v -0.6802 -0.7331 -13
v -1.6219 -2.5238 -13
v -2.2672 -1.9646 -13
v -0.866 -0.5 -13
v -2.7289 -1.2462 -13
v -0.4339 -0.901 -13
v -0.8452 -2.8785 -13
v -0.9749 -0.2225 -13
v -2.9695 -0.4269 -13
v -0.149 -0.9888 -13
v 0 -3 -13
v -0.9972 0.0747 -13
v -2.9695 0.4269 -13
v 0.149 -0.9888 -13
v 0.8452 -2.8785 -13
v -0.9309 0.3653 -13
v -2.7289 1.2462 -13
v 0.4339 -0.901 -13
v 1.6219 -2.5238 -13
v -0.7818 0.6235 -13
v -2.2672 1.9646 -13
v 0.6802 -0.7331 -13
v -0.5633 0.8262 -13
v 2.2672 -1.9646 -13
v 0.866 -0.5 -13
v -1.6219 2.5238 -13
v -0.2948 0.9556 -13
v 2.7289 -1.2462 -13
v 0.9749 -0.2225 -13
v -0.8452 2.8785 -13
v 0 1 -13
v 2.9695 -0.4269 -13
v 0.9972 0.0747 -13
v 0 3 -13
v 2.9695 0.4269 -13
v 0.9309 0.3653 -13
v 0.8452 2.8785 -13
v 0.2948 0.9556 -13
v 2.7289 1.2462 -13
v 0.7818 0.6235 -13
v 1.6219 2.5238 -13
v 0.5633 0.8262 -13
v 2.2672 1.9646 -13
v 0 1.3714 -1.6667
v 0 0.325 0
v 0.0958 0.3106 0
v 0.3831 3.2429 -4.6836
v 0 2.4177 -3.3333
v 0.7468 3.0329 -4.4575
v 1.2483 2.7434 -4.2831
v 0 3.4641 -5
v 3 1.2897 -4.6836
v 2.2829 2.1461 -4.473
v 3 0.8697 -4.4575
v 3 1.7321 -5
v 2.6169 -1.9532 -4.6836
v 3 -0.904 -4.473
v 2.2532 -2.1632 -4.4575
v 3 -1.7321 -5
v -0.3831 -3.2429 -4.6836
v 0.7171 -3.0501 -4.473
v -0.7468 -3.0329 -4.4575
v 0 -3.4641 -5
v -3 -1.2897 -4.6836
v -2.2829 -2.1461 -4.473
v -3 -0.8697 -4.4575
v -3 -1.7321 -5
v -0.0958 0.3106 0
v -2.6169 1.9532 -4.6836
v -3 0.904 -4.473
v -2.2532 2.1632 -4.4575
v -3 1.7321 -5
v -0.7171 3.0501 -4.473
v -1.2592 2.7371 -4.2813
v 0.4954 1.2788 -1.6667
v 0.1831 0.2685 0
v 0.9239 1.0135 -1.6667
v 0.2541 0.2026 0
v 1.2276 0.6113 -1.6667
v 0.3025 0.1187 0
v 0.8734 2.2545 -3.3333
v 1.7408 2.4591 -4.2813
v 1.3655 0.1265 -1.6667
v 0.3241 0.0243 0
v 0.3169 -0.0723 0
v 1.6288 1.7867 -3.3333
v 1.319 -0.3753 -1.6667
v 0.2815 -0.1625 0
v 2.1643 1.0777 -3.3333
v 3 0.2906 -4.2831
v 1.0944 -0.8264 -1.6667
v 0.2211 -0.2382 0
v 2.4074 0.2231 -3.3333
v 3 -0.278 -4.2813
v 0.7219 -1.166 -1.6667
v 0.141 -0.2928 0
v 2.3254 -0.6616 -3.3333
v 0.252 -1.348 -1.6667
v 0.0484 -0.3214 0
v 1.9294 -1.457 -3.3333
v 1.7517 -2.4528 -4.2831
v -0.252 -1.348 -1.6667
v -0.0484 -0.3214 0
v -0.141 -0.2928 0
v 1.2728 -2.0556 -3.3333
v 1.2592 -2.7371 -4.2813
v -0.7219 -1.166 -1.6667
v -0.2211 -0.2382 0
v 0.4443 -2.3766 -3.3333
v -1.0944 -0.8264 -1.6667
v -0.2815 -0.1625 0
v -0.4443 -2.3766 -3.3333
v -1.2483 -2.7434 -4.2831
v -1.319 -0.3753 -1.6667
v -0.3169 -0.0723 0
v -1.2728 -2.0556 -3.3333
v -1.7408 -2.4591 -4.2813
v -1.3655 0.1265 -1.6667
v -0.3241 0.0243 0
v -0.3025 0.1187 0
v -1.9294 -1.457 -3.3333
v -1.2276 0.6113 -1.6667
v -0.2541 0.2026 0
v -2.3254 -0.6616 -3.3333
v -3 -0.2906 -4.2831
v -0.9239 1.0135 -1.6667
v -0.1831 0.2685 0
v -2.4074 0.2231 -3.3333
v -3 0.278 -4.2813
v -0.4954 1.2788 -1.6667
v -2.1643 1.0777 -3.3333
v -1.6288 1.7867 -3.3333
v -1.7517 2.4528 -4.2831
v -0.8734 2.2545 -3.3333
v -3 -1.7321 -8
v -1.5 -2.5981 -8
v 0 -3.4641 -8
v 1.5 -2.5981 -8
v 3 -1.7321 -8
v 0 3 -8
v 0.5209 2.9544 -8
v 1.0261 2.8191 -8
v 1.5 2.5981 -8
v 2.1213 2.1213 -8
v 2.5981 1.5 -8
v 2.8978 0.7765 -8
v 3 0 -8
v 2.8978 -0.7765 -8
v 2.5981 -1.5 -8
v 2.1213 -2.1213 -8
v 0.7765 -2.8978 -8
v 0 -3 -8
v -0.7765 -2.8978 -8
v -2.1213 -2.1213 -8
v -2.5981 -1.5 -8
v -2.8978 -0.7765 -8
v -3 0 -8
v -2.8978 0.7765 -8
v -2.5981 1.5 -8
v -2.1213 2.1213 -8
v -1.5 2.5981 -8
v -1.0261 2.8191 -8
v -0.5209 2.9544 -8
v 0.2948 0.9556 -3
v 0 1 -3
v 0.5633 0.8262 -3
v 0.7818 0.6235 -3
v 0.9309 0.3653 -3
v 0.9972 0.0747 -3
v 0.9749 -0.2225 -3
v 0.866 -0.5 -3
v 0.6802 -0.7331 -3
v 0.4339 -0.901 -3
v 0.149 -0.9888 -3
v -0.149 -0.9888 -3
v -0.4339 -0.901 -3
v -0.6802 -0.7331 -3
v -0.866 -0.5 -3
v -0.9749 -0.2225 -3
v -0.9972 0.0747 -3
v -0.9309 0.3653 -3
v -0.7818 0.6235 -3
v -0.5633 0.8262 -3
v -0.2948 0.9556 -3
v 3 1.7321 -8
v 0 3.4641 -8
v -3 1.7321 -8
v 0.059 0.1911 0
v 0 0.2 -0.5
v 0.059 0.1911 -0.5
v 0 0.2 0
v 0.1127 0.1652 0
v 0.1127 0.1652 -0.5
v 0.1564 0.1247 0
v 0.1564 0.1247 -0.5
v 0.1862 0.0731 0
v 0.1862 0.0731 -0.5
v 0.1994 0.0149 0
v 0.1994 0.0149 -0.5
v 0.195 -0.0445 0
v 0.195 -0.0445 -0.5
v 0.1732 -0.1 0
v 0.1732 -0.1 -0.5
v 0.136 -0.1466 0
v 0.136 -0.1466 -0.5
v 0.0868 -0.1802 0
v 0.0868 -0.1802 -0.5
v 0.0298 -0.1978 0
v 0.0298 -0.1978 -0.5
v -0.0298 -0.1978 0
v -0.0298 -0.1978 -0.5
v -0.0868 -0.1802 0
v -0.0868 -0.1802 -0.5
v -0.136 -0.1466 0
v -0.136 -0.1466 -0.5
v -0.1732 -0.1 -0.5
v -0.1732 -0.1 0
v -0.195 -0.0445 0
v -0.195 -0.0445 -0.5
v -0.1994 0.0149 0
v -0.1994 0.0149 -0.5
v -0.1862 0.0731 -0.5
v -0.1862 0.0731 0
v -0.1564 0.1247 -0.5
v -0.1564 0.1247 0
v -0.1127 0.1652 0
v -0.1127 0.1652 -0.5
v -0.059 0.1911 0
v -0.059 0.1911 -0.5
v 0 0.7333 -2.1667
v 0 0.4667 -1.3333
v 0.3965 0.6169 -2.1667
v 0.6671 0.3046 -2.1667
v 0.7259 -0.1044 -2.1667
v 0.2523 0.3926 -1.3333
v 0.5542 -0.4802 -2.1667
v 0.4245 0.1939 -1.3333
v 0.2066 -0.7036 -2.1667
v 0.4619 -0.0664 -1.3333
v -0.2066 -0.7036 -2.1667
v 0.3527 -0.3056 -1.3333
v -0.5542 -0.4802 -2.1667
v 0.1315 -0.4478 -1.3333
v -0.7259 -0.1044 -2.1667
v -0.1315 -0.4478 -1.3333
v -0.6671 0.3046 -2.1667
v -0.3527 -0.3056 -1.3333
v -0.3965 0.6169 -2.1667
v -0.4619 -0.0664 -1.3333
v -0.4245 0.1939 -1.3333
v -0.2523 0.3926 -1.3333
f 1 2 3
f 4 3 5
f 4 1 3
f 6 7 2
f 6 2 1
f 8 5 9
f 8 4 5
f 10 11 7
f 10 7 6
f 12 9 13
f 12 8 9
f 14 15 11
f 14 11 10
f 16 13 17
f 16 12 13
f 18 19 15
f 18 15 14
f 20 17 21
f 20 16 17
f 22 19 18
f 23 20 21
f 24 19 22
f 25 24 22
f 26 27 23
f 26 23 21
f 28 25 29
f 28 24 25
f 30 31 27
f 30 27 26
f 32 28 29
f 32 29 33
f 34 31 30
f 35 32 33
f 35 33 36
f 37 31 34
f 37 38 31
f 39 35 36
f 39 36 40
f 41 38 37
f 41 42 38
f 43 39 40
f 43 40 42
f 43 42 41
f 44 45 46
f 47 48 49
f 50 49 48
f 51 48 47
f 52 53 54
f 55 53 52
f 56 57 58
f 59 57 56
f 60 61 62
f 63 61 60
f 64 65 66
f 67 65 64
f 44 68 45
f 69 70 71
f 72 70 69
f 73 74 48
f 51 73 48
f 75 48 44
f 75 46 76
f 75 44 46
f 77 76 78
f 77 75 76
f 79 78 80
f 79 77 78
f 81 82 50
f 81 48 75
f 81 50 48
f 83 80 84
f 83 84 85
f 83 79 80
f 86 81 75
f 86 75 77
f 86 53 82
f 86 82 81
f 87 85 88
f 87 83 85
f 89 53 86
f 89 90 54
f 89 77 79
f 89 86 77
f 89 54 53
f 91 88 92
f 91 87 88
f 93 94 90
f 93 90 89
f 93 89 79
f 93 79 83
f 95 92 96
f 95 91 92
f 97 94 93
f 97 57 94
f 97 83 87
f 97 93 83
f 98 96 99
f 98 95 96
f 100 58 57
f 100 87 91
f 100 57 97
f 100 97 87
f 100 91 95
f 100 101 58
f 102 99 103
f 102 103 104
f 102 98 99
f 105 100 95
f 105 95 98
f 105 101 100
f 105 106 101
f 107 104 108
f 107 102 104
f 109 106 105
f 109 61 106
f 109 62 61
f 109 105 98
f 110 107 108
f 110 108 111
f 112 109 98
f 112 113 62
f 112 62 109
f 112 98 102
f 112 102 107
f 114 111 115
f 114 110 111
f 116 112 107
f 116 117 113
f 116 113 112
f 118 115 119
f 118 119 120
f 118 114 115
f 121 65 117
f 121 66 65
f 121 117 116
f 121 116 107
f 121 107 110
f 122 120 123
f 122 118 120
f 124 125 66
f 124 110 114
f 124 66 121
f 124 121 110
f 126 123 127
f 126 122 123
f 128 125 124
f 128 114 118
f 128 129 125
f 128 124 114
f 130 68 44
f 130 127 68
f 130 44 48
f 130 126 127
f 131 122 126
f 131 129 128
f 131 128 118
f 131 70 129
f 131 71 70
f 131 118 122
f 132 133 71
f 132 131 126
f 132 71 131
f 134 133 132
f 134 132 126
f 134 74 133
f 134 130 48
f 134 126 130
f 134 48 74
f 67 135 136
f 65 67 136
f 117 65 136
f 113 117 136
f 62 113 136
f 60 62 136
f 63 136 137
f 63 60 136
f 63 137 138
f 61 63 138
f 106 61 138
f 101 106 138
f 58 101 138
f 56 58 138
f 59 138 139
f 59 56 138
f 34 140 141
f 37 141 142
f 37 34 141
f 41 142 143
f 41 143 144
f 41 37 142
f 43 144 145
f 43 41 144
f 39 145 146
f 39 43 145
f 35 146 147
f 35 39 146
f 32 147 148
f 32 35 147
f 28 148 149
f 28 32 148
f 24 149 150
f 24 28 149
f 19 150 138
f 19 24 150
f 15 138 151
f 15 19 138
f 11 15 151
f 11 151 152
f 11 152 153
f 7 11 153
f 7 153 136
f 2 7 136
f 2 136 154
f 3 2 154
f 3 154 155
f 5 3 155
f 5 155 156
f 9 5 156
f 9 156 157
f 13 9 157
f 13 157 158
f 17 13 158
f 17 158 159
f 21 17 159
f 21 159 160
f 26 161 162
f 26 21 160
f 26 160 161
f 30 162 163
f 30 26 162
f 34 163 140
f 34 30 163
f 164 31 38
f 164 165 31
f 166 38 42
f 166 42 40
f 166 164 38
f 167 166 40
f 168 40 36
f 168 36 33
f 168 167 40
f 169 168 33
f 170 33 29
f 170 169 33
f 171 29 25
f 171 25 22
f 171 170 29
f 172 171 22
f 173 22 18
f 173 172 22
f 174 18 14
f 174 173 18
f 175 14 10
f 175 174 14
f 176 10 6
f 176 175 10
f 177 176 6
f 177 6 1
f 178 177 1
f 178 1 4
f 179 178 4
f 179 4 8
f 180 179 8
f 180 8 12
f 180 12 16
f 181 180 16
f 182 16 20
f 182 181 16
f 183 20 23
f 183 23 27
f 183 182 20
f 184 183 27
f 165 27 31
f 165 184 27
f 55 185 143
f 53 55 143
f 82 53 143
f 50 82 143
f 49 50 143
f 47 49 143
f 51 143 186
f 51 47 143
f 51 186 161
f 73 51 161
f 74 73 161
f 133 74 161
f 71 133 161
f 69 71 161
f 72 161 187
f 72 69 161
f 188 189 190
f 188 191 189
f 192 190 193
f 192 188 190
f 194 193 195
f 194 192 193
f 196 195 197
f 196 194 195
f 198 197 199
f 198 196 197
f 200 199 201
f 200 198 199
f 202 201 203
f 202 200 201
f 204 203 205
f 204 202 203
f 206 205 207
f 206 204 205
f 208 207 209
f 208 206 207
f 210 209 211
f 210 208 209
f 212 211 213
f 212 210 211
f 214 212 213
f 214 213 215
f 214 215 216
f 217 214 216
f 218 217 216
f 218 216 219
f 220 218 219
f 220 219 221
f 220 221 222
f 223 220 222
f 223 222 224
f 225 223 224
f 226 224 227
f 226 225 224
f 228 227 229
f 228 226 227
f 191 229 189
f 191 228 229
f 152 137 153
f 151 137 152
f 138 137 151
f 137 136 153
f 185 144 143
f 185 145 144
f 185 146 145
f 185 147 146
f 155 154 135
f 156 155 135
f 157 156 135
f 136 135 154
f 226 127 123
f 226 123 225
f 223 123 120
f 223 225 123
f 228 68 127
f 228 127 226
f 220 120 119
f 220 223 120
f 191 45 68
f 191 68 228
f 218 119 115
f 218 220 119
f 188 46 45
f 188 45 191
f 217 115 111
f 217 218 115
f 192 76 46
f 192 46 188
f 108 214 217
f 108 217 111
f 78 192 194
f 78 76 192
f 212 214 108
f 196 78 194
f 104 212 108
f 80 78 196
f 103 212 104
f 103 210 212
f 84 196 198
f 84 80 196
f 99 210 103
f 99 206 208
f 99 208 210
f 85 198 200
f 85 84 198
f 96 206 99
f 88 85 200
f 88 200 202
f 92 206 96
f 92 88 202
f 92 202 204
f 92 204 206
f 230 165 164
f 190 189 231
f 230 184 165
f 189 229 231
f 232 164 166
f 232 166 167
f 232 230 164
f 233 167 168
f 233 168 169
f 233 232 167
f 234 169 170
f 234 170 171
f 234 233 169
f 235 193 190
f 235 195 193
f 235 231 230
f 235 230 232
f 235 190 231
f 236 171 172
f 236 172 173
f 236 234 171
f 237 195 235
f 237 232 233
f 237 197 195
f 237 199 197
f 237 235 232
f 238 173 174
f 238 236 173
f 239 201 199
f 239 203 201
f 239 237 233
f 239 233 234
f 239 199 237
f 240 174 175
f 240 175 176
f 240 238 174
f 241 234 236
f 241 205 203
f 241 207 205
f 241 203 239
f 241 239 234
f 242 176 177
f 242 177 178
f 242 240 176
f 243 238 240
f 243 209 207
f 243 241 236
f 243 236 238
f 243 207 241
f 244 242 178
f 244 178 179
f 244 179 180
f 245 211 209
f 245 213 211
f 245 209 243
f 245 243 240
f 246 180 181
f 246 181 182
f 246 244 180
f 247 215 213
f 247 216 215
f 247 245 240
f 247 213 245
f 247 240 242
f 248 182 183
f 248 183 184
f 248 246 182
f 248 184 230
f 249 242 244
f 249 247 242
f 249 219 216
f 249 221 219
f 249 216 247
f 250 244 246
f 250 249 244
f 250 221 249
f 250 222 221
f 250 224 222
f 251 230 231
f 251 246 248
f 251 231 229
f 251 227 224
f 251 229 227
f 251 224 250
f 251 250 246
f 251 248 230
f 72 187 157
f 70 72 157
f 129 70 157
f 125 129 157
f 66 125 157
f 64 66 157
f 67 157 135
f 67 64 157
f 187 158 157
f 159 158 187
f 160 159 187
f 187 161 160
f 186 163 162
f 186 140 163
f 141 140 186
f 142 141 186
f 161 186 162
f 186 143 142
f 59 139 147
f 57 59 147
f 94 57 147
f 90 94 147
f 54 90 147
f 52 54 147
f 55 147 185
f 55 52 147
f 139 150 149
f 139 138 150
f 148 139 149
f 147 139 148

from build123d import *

# Parameters (mm, degrees)
SKETCH4_OUTSIDE_W  = 12.184
SKETCH4_OUTSIDE_H  = 12.184
CUT_EXTRUDE5_DEPTH = 14


with BuildPart() as part:
    # Sketch1 → Revolve2 (revolve)
    with BuildSketch(Plane(origin=(0, 0, 0), x_dir=(0, 0, -1), z_dir=(1, 0, 0))):
        Polygon((0, 0.2), (0, 0.325), (5, 3.464101615), (8, 3.464101615), (8, 3), (13, 3), (13, 1), (3, 1), (0.5, 0.2), align=None)
    revolve(axis=Axis((0, 0, 0), (0, 0, -1)))

    # Sketch4 outside → Cut-Extrude5 (cut, through all)
    with BuildSketch(Plane.XY):
        Rectangle(SKETCH4_OUTSIDE_W, SKETCH4_OUTSIDE_H)
        Polygon((0, 3.464101615), (-3, 1.732050808), (-3, -1.732050808), (0, -3.464101615), (3, -1.732050808), (3, 1.732050808), align=None, mode=Mode.SUBTRACT)
    extrude(amount=-CUT_EXTRUDE5_DEPTH, mode=Mode.SUBTRACT)


solid = part.part
